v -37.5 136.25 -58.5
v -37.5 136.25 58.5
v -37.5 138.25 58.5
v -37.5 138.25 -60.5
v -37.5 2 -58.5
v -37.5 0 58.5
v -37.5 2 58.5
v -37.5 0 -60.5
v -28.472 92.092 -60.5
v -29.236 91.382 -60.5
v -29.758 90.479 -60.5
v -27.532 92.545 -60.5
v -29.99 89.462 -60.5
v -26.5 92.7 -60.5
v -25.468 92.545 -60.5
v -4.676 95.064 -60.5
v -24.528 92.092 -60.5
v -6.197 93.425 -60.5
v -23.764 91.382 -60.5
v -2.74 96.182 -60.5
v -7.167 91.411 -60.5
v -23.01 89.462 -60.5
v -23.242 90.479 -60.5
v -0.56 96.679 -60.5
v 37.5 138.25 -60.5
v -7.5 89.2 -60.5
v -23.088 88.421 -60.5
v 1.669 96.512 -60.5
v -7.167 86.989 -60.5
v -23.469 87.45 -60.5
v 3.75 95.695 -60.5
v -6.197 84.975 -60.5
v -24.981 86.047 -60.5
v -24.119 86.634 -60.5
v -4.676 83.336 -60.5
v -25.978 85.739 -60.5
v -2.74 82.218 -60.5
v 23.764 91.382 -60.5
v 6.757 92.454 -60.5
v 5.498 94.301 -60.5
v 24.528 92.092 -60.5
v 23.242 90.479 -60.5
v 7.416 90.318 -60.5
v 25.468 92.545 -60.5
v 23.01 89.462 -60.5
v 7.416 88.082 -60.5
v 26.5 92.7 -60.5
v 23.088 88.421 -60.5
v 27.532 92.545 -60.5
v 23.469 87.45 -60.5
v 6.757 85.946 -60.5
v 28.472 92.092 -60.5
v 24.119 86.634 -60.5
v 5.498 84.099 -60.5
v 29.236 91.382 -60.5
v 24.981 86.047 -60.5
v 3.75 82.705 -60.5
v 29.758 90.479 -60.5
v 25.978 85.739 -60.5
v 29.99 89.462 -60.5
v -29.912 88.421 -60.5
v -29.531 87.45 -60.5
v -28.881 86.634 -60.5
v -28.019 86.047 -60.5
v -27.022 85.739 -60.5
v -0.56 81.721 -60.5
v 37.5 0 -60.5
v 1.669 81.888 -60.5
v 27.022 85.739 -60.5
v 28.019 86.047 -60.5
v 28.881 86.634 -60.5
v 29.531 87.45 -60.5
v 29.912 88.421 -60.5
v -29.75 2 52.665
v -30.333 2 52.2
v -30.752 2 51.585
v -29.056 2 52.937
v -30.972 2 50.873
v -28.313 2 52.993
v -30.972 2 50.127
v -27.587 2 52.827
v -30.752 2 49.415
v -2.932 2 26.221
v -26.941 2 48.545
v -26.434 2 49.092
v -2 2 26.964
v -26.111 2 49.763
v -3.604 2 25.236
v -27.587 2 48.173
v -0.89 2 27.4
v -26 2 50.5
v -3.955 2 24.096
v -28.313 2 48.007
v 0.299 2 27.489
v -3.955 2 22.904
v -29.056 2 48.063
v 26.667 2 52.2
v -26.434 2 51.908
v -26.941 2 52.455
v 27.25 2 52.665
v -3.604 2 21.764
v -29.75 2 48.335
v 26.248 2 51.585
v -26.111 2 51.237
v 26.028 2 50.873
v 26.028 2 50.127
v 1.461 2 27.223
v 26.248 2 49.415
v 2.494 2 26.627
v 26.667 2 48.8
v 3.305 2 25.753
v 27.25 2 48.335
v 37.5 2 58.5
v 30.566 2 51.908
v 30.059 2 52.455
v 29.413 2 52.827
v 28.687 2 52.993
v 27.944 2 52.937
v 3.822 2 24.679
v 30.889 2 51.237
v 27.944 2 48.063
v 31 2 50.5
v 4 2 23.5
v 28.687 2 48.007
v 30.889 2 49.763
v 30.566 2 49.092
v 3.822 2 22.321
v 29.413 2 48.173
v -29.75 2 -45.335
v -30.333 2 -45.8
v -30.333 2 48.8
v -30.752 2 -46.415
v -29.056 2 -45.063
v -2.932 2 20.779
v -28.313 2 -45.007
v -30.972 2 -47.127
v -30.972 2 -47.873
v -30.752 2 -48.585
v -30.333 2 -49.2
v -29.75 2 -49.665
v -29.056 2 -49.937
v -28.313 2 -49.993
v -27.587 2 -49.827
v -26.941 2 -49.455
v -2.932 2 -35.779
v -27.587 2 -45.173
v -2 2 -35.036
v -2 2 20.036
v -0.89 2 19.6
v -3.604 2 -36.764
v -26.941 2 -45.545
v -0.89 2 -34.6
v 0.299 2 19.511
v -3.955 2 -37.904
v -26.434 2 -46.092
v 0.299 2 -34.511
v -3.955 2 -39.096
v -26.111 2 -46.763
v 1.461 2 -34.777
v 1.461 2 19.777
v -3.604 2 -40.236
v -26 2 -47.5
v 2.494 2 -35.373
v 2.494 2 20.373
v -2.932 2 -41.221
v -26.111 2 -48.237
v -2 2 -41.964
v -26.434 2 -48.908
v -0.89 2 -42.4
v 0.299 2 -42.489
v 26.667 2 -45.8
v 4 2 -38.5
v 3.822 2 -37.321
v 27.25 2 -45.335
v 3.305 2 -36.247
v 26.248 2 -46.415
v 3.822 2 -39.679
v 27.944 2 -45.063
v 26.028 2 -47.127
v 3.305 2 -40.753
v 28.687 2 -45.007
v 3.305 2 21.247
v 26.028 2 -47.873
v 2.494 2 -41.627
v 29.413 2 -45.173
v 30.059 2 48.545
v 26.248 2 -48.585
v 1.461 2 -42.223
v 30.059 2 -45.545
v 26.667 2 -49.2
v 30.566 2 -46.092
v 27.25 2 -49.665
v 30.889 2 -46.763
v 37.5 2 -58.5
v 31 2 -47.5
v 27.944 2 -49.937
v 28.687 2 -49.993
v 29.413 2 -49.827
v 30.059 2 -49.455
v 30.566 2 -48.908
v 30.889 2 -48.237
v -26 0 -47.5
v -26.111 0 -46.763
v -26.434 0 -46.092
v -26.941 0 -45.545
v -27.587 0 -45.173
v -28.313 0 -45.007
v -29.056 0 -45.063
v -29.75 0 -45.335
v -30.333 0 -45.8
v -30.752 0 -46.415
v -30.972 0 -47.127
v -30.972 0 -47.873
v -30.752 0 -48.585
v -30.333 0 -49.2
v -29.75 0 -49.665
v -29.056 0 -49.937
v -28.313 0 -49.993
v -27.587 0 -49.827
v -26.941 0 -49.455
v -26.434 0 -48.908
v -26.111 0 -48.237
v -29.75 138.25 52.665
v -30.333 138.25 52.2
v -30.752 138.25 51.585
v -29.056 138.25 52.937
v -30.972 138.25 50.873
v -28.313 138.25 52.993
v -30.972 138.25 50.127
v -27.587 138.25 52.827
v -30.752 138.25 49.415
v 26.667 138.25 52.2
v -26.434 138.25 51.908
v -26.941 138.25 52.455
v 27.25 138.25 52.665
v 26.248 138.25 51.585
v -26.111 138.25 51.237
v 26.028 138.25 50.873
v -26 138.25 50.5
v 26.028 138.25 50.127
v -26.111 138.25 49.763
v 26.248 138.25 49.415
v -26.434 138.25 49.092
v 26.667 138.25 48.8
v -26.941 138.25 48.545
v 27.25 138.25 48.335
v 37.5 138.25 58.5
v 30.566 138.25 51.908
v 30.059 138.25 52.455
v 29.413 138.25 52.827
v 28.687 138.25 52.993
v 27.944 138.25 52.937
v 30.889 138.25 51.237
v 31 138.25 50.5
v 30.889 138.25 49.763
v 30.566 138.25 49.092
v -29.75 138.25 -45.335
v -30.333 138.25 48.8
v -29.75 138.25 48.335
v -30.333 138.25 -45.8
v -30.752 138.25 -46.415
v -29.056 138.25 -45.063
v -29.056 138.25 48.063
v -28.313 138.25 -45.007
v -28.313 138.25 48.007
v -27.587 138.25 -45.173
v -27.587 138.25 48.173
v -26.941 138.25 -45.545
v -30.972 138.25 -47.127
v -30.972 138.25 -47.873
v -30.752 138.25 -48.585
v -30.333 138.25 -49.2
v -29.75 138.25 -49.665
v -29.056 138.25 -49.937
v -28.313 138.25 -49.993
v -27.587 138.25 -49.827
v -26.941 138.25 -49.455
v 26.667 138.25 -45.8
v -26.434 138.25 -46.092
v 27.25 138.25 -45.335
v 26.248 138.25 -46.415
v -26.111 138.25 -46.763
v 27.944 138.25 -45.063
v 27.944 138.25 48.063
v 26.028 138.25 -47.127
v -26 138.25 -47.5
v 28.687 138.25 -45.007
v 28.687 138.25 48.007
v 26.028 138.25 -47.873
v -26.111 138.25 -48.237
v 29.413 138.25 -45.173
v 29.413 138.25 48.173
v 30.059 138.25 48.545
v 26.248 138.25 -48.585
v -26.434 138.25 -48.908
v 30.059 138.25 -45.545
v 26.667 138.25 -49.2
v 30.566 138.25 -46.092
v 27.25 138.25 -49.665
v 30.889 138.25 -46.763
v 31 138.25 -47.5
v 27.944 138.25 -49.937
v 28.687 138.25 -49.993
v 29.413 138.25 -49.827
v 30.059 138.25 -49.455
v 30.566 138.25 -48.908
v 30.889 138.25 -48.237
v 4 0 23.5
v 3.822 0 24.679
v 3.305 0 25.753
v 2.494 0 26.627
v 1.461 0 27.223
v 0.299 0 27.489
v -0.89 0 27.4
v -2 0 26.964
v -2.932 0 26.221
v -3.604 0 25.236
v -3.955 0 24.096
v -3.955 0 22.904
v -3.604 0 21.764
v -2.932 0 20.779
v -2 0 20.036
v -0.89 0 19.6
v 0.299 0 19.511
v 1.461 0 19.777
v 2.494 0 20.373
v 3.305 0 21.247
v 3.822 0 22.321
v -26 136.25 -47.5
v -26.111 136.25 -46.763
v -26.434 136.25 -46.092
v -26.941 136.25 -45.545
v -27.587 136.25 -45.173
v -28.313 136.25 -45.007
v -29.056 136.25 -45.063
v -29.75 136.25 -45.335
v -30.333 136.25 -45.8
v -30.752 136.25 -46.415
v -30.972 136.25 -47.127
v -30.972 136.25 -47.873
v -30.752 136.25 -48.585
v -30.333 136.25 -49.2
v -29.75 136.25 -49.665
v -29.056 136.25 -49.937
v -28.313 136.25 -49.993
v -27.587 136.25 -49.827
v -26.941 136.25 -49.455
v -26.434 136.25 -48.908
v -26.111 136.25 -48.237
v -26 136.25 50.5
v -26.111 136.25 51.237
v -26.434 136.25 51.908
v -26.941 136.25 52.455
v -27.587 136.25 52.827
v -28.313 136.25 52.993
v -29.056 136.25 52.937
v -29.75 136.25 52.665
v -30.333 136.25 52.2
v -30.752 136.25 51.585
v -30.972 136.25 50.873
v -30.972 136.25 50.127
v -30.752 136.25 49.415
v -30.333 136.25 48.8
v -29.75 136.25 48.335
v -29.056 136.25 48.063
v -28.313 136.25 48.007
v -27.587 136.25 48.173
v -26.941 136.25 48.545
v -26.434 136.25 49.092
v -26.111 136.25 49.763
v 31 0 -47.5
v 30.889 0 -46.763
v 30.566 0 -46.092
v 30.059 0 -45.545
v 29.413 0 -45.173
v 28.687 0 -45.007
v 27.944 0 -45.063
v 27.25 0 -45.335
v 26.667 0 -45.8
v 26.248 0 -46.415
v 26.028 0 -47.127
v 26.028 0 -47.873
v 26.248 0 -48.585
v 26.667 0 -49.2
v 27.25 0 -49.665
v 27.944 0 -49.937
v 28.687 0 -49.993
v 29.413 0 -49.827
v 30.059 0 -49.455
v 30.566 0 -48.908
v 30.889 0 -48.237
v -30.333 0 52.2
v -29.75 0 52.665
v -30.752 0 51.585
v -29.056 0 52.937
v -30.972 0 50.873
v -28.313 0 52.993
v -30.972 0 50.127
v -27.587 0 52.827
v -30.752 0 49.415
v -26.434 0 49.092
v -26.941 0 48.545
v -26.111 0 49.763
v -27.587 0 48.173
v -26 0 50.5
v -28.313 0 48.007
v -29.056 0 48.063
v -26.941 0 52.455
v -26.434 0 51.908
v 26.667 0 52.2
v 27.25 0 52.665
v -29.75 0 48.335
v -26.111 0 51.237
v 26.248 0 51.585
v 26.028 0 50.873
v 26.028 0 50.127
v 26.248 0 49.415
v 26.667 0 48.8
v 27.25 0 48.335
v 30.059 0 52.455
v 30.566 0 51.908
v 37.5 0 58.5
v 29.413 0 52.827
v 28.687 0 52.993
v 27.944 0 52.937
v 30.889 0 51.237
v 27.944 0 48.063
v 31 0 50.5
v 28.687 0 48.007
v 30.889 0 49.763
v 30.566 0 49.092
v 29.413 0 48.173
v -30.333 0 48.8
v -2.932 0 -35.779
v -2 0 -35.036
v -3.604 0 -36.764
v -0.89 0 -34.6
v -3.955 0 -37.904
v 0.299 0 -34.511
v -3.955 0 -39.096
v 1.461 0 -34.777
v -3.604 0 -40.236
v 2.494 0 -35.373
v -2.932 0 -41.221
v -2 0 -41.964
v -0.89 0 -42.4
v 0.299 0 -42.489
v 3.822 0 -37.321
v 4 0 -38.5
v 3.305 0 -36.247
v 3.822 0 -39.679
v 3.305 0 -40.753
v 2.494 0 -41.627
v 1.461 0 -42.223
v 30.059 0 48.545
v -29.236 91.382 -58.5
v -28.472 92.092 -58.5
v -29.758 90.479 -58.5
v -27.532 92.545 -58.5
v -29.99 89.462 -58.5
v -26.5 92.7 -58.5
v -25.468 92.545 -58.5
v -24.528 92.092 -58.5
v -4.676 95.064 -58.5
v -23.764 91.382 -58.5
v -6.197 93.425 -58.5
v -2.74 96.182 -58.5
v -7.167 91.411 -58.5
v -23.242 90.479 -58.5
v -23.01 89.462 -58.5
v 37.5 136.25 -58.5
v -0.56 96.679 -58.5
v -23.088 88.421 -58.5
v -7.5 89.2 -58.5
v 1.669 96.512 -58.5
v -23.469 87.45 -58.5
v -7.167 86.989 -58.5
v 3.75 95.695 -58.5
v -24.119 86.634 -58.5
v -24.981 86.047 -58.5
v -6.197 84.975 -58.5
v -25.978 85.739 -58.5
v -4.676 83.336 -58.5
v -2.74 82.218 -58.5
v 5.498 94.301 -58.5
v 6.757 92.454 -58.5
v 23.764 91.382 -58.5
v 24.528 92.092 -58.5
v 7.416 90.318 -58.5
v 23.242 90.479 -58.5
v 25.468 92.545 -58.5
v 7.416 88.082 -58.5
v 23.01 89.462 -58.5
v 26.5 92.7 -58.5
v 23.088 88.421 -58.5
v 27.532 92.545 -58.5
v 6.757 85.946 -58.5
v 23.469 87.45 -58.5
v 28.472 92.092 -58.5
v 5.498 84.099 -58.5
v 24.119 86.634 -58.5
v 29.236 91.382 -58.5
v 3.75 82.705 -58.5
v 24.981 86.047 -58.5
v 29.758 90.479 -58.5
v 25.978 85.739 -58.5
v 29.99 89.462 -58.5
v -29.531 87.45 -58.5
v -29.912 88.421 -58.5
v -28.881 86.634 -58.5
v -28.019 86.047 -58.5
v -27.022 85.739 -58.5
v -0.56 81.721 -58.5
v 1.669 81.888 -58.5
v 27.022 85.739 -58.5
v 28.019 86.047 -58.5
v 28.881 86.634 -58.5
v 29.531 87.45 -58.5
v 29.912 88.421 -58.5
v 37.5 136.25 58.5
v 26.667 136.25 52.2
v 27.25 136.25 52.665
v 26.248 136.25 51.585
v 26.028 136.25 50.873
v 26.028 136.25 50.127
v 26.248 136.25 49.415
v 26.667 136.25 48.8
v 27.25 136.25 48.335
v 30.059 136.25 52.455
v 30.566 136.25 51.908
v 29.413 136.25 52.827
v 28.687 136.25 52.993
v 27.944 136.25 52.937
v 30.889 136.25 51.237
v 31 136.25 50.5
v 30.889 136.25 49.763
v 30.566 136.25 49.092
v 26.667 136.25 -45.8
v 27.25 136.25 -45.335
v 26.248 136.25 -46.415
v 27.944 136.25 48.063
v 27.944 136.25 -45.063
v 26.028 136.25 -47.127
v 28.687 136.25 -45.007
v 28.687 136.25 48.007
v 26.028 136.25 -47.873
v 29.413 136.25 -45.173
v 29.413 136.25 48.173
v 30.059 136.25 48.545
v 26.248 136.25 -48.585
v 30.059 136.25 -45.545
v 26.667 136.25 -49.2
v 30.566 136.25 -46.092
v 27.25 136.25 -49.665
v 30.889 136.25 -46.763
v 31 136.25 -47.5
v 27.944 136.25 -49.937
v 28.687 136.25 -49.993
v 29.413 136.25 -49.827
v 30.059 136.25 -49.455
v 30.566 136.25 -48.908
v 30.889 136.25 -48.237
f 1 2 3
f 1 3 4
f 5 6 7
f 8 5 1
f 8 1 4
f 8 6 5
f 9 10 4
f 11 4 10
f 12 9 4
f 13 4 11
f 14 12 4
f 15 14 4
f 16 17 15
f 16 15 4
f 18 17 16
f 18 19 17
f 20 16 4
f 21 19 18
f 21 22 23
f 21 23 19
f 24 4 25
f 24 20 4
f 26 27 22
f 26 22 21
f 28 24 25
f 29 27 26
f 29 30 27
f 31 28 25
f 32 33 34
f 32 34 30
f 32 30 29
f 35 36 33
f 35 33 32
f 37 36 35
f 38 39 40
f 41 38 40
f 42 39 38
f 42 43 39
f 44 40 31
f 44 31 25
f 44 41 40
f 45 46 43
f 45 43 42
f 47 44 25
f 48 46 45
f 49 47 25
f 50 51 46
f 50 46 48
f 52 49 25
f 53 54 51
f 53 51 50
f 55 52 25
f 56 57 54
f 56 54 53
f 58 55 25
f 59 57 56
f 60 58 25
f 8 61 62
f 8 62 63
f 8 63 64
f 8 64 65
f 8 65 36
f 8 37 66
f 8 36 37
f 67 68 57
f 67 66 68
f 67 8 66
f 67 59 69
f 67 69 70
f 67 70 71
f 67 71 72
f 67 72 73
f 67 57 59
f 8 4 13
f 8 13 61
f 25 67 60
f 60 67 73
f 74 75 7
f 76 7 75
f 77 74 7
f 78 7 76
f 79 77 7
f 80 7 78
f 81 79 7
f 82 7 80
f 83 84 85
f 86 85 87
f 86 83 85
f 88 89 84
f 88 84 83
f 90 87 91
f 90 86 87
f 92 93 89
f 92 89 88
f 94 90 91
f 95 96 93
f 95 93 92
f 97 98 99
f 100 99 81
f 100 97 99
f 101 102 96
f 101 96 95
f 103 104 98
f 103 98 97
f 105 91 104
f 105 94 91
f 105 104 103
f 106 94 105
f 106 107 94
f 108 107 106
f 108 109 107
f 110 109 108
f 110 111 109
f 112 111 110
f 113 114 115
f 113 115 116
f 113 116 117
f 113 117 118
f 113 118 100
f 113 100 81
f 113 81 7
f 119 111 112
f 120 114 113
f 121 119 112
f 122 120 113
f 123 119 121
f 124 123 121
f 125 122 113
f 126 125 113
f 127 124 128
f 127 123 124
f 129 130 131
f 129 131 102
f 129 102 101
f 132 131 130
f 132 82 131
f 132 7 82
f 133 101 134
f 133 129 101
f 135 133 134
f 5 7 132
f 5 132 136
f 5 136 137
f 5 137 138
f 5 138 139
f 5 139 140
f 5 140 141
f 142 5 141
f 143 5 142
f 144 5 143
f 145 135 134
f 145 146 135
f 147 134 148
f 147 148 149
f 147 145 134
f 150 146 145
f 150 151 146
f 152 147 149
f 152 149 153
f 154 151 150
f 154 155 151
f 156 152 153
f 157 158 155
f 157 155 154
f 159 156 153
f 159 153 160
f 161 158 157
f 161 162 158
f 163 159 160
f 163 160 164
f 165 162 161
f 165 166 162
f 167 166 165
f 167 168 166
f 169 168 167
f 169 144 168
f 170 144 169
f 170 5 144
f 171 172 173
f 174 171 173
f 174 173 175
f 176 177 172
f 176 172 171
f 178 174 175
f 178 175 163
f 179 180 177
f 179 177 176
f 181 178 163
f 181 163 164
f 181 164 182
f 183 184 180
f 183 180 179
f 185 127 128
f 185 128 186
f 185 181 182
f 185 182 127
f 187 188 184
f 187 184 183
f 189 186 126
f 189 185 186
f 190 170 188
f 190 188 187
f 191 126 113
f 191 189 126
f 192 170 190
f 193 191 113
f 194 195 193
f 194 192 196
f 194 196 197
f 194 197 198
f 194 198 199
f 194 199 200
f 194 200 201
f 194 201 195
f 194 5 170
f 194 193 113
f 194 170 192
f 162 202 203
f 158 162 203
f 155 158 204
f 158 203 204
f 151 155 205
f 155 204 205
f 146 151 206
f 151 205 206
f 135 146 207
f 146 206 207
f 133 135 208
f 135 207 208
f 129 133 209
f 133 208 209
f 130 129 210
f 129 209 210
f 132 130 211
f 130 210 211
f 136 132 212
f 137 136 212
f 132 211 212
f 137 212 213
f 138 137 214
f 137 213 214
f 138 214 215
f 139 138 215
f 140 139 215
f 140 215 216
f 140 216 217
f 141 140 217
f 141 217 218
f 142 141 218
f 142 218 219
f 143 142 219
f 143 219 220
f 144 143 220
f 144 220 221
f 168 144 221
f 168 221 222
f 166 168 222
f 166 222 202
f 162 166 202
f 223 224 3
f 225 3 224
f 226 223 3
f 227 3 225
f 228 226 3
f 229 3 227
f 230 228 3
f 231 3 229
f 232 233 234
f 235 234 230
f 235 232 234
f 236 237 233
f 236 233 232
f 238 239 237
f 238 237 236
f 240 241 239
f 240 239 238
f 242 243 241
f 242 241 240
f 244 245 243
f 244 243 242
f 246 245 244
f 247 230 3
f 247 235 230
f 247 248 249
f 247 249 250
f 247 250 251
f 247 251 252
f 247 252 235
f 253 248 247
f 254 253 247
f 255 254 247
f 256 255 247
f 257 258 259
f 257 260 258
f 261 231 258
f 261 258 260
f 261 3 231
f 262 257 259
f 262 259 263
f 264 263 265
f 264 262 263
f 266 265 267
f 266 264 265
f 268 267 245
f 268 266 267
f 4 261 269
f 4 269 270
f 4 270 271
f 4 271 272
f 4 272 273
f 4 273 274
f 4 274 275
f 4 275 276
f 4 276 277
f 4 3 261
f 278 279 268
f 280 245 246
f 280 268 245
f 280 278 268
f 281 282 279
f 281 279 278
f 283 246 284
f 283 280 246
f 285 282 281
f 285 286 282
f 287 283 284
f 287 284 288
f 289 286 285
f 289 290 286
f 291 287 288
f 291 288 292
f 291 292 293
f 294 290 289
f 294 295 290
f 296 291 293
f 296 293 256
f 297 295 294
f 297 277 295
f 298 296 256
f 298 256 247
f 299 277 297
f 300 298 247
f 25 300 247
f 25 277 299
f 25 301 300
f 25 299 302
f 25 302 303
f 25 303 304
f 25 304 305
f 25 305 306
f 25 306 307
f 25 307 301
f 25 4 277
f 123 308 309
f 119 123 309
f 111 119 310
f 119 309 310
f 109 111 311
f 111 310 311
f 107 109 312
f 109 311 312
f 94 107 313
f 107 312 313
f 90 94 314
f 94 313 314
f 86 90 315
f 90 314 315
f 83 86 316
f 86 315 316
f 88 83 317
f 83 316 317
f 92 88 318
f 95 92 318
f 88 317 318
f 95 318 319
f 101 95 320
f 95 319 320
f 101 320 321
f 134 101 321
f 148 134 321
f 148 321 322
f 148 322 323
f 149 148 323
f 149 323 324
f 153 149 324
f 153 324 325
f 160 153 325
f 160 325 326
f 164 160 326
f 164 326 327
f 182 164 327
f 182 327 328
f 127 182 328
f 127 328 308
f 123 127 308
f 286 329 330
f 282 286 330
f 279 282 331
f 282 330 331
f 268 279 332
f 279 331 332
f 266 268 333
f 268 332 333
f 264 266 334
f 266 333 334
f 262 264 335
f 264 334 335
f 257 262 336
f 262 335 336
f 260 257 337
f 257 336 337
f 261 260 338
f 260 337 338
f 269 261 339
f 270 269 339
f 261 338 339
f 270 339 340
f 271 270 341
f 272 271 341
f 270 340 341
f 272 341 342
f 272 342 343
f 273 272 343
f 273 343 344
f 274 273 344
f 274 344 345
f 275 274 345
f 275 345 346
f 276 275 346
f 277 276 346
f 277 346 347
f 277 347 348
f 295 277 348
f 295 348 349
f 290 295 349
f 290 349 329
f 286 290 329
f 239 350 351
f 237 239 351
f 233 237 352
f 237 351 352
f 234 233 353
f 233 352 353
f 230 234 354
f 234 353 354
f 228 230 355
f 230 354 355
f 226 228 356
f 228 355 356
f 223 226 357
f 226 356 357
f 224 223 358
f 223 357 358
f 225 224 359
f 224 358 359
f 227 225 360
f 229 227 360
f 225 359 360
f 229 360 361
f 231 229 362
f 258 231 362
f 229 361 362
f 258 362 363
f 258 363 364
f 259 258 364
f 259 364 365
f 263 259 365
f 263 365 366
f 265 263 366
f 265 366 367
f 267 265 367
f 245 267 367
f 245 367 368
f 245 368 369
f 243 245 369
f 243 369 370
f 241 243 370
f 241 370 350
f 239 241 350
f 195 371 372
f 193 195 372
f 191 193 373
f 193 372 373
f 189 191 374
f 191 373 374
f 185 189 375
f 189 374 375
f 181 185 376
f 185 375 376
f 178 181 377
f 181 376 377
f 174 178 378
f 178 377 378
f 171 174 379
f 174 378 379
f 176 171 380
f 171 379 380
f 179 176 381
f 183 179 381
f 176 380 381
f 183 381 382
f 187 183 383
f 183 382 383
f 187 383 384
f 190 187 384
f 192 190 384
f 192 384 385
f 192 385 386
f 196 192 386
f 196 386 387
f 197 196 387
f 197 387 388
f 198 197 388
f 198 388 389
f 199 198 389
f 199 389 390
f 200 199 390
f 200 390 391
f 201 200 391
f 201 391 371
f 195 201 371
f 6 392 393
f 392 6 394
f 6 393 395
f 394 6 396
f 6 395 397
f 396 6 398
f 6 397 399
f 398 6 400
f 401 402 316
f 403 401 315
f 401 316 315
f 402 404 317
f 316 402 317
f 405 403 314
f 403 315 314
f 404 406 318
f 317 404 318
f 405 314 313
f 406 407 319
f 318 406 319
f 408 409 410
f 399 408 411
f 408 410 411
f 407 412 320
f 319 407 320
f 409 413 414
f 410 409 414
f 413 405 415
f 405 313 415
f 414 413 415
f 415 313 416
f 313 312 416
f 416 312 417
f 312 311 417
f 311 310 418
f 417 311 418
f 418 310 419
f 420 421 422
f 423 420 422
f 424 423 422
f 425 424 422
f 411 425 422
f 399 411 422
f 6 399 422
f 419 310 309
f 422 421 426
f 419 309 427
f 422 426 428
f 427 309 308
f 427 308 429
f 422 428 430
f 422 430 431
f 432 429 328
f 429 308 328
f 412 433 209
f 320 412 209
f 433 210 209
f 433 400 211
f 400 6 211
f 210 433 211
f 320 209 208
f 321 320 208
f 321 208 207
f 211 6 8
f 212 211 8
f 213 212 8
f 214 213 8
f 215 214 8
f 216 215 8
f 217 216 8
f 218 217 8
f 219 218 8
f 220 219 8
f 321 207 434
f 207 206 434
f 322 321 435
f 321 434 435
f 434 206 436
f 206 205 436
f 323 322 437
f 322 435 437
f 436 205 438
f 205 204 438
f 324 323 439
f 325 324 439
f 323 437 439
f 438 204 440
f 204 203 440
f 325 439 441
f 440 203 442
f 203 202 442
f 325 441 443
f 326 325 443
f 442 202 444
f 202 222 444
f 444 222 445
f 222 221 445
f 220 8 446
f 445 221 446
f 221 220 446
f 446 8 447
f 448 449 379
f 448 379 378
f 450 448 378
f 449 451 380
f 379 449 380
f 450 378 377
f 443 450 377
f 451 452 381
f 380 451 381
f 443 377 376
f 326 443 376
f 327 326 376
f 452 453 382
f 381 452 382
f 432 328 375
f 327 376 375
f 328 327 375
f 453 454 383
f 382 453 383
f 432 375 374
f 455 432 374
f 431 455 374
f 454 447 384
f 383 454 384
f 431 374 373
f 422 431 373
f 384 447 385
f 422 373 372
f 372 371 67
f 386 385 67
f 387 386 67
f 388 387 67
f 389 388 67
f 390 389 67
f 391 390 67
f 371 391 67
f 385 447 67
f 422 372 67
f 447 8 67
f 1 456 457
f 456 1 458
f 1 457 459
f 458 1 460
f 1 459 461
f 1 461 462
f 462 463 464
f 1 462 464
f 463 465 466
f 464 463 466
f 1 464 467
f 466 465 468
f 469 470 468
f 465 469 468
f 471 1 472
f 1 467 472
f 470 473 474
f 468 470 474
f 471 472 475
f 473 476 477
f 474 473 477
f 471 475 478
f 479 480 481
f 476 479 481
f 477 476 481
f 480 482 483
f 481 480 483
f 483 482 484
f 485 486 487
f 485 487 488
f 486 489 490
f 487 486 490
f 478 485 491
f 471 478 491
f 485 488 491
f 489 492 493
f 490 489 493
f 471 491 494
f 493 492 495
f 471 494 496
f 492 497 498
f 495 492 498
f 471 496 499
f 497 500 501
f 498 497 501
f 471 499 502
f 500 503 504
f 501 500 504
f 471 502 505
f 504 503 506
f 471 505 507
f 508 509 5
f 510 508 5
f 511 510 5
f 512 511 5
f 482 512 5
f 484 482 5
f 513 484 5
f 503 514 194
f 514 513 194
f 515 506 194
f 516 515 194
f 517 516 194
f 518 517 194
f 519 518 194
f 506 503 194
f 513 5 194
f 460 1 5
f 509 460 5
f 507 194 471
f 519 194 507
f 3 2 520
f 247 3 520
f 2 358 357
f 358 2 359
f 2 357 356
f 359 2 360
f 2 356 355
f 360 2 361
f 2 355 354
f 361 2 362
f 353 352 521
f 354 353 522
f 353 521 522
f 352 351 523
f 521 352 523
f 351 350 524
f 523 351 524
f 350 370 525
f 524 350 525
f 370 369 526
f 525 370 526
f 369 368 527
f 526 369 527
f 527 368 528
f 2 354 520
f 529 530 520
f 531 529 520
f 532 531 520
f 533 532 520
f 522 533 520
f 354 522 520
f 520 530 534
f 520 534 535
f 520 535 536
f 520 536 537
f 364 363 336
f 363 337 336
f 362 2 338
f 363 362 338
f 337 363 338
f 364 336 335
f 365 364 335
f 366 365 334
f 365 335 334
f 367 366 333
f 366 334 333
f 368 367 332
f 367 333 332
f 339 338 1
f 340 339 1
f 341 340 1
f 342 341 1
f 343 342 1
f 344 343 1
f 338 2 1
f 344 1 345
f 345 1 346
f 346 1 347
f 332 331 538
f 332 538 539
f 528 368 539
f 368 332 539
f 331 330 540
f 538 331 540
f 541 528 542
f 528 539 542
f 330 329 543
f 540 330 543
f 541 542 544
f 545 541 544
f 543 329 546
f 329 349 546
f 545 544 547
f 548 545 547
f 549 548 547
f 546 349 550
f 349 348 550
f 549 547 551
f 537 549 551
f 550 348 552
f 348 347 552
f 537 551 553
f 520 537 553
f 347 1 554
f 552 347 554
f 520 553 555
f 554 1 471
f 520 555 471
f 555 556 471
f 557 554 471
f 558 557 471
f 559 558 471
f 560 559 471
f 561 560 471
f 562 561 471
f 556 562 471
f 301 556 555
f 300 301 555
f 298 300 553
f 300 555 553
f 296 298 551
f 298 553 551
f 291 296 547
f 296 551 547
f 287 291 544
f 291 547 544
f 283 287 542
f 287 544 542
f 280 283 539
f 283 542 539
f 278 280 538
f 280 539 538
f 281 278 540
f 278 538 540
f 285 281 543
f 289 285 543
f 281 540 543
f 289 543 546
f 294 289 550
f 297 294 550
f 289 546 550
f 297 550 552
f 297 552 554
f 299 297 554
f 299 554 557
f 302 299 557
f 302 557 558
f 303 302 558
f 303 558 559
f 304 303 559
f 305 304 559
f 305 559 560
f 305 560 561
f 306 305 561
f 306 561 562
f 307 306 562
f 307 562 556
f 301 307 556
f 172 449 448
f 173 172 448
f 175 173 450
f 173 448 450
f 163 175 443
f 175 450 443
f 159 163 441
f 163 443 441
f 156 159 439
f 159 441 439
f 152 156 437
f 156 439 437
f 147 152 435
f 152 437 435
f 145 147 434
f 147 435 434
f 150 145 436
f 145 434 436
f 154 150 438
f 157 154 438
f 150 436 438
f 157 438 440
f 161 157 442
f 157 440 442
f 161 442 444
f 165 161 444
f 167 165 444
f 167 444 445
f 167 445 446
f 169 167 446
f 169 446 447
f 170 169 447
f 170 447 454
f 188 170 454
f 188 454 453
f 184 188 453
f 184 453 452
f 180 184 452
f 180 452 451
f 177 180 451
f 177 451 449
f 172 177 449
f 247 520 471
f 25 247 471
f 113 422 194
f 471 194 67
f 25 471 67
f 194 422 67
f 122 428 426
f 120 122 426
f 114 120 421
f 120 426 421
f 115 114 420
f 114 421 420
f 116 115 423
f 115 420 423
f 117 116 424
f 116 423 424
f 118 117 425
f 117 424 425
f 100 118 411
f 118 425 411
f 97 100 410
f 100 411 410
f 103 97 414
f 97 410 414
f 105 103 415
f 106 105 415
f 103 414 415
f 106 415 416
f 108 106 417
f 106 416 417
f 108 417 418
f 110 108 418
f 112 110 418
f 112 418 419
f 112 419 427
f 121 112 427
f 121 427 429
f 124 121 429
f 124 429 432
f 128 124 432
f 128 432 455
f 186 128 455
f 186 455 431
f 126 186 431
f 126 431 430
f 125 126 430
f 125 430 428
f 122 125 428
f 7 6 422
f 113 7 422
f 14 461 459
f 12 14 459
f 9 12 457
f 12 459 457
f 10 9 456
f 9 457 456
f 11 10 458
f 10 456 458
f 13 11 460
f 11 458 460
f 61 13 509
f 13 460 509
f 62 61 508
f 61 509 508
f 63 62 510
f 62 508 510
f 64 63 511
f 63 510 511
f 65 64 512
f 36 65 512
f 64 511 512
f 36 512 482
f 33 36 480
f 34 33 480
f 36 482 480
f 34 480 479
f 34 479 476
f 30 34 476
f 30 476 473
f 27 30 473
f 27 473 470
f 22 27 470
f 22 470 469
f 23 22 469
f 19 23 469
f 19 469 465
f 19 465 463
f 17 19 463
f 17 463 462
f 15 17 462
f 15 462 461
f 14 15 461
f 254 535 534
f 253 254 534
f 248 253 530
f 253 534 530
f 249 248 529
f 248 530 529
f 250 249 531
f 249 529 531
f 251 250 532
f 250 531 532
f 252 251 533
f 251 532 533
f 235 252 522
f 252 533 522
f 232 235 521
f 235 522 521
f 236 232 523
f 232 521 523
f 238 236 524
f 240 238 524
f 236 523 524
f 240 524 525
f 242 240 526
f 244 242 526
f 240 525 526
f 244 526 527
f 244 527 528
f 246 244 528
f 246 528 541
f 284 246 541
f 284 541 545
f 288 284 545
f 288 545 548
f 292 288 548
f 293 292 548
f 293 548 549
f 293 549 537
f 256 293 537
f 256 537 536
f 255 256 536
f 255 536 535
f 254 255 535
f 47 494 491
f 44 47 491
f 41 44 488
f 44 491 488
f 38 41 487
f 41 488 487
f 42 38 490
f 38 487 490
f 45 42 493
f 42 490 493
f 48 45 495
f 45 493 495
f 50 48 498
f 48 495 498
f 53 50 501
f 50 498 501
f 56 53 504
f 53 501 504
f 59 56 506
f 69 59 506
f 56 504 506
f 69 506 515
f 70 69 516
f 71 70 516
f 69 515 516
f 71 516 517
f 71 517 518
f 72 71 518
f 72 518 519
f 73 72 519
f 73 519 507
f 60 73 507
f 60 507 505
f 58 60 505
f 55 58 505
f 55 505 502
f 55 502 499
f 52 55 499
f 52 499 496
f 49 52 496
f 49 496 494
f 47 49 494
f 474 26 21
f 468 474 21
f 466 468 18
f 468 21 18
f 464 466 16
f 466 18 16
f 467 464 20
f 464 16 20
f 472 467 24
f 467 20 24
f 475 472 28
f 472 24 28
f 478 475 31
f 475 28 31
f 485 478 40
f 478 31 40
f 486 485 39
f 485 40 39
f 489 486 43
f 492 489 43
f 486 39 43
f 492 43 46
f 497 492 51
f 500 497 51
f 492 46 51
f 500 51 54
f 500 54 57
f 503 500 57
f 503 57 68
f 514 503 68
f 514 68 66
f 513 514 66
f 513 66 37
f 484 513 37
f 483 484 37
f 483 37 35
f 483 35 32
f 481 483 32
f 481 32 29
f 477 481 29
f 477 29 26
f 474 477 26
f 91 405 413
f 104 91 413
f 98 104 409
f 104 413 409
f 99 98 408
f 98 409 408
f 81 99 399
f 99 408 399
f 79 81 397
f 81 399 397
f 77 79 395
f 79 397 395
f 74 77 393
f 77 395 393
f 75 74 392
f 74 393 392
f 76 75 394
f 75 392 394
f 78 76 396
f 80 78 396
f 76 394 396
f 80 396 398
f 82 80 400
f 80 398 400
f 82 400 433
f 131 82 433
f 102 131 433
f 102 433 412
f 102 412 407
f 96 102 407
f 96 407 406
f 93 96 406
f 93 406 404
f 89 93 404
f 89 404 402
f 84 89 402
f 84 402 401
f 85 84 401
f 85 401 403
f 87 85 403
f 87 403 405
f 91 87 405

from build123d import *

# Parameters (mm, degrees)
ESBO_O1_W                = 75
ESBO_O1_H                = 117
RESSALTO_EXTRUS_O1_DEPTH = 2
ESBO_O2_W                = 75
ESBO_O2_H                = 2
RESSALTO_EXTRUS_O2_DEPTH = 136.25
ESBO_O3_W                = 75
ESBO_O3_H                = 119
RESSALTO_EXTRUS_O3_DEPTH = 2
ESBO_O4_R                = 2.5
CORTE_EXTRUS_O1_DEPTH    = 139.25
ESBO_O5_R                = 7.5
CORTE_EXTRUS_O2_DEPTH    = 10
CORTE_EXTRUS_O3_DEPTH    = 10
ESBO_O7_R                = 4
CORTE_EXTRUS_O4_DEPTH    = 10


with BuildPart() as part:
    # Esboço1 → Ressalto-extrusão1 (new body)
    with BuildSketch(Plane(origin=(0, 0, 0), x_dir=(1, 0, 0), z_dir=(0, 1, 0))):
        Rectangle(ESBO_O1_W, ESBO_O1_H)
    extrude(amount=RESSALTO_EXTRUS_O1_DEPTH)

    # Esboço2 → Ressalto-extrusão2 (add)
    with BuildSketch(Plane(origin=(0, 0, 0), x_dir=(1, 0, 0), z_dir=(0, 1, 0))):
        with Locations((0, 59.5)):
            Rectangle(ESBO_O2_W, ESBO_O2_H)
    extrude(amount=RESSALTO_EXTRUS_O2_DEPTH)

    # Esboço3 → Ressalto-extrusão3 (add)
    with BuildSketch(Plane(origin=(0, 136.25, 0), x_dir=(1, 0, 0), z_dir=(0, 1, 0))):
        with Locations((0, 1)):
            Rectangle(ESBO_O3_W, ESBO_O3_H)
    extrude(amount=RESSALTO_EXTRUS_O3_DEPTH)

    # Esboço4 → Corte-extrusão1 (cut, through all)
    with BuildSketch(Plane.XZ):
        with Locations((28.5, -47.5)):
            Circle(ESBO_O4_R)
        with Locations((-28.5, -47.5)):
            Circle(ESBO_O4_R)
        with Locations((28.5, 50.5)):
            Circle(ESBO_O4_R)
        with Locations((-28.5, 50.5)):
            Circle(ESBO_O4_R)
    extrude(amount=-CORTE_EXTRUS_O1_DEPTH, mode=Mode.SUBTRACT)

    # Esboço5 → Corte-extrusão2 (cut)
    with BuildSketch(Plane(origin=(0, 0, -60.5), x_dir=(-1, 0, 0), z_dir=(0, 0, -1))):
        with Locations((0, 89.2)):
            Circle(ESBO_O5_R)
    extrude(amount=-CORTE_EXTRUS_O2_DEPTH, mode=Mode.SUBTRACT)

    # Esboço6 → Corte-extrusão3 (cut)
    with BuildSketch(Plane.XY.offset(-58.5)):
        with BuildLine():
            ThreePointArc((26.5, 85.7), (30, 89.2), (26.5, 92.7))
            ThreePointArc((26.5, 92.7), (23, 89.2), (26.5, 85.7))
        make_face()
        with BuildLine():
            ThreePointArc((-26.5, 85.7), (-23, 89.2), (-26.5, 92.7))
            ThreePointArc((-26.5, 92.7), (-30, 89.2), (-26.5, 85.7))
        make_face()
    extrude(amount=-CORTE_EXTRUS_O3_DEPTH, mode=Mode.SUBTRACT)

    # Esboço7 → Corte-extrusão4 (cut)
    with BuildSketch(Plane.XZ):
        with Locations((0, -38.5)):
            Circle(ESBO_O7_R)
        with Locations((0, 23.5)):
            Circle(ESBO_O7_R)
    extrude(amount=-CORTE_EXTRUS_O4_DEPTH, mode=Mode.SUBTRACT)


solid = part.part
